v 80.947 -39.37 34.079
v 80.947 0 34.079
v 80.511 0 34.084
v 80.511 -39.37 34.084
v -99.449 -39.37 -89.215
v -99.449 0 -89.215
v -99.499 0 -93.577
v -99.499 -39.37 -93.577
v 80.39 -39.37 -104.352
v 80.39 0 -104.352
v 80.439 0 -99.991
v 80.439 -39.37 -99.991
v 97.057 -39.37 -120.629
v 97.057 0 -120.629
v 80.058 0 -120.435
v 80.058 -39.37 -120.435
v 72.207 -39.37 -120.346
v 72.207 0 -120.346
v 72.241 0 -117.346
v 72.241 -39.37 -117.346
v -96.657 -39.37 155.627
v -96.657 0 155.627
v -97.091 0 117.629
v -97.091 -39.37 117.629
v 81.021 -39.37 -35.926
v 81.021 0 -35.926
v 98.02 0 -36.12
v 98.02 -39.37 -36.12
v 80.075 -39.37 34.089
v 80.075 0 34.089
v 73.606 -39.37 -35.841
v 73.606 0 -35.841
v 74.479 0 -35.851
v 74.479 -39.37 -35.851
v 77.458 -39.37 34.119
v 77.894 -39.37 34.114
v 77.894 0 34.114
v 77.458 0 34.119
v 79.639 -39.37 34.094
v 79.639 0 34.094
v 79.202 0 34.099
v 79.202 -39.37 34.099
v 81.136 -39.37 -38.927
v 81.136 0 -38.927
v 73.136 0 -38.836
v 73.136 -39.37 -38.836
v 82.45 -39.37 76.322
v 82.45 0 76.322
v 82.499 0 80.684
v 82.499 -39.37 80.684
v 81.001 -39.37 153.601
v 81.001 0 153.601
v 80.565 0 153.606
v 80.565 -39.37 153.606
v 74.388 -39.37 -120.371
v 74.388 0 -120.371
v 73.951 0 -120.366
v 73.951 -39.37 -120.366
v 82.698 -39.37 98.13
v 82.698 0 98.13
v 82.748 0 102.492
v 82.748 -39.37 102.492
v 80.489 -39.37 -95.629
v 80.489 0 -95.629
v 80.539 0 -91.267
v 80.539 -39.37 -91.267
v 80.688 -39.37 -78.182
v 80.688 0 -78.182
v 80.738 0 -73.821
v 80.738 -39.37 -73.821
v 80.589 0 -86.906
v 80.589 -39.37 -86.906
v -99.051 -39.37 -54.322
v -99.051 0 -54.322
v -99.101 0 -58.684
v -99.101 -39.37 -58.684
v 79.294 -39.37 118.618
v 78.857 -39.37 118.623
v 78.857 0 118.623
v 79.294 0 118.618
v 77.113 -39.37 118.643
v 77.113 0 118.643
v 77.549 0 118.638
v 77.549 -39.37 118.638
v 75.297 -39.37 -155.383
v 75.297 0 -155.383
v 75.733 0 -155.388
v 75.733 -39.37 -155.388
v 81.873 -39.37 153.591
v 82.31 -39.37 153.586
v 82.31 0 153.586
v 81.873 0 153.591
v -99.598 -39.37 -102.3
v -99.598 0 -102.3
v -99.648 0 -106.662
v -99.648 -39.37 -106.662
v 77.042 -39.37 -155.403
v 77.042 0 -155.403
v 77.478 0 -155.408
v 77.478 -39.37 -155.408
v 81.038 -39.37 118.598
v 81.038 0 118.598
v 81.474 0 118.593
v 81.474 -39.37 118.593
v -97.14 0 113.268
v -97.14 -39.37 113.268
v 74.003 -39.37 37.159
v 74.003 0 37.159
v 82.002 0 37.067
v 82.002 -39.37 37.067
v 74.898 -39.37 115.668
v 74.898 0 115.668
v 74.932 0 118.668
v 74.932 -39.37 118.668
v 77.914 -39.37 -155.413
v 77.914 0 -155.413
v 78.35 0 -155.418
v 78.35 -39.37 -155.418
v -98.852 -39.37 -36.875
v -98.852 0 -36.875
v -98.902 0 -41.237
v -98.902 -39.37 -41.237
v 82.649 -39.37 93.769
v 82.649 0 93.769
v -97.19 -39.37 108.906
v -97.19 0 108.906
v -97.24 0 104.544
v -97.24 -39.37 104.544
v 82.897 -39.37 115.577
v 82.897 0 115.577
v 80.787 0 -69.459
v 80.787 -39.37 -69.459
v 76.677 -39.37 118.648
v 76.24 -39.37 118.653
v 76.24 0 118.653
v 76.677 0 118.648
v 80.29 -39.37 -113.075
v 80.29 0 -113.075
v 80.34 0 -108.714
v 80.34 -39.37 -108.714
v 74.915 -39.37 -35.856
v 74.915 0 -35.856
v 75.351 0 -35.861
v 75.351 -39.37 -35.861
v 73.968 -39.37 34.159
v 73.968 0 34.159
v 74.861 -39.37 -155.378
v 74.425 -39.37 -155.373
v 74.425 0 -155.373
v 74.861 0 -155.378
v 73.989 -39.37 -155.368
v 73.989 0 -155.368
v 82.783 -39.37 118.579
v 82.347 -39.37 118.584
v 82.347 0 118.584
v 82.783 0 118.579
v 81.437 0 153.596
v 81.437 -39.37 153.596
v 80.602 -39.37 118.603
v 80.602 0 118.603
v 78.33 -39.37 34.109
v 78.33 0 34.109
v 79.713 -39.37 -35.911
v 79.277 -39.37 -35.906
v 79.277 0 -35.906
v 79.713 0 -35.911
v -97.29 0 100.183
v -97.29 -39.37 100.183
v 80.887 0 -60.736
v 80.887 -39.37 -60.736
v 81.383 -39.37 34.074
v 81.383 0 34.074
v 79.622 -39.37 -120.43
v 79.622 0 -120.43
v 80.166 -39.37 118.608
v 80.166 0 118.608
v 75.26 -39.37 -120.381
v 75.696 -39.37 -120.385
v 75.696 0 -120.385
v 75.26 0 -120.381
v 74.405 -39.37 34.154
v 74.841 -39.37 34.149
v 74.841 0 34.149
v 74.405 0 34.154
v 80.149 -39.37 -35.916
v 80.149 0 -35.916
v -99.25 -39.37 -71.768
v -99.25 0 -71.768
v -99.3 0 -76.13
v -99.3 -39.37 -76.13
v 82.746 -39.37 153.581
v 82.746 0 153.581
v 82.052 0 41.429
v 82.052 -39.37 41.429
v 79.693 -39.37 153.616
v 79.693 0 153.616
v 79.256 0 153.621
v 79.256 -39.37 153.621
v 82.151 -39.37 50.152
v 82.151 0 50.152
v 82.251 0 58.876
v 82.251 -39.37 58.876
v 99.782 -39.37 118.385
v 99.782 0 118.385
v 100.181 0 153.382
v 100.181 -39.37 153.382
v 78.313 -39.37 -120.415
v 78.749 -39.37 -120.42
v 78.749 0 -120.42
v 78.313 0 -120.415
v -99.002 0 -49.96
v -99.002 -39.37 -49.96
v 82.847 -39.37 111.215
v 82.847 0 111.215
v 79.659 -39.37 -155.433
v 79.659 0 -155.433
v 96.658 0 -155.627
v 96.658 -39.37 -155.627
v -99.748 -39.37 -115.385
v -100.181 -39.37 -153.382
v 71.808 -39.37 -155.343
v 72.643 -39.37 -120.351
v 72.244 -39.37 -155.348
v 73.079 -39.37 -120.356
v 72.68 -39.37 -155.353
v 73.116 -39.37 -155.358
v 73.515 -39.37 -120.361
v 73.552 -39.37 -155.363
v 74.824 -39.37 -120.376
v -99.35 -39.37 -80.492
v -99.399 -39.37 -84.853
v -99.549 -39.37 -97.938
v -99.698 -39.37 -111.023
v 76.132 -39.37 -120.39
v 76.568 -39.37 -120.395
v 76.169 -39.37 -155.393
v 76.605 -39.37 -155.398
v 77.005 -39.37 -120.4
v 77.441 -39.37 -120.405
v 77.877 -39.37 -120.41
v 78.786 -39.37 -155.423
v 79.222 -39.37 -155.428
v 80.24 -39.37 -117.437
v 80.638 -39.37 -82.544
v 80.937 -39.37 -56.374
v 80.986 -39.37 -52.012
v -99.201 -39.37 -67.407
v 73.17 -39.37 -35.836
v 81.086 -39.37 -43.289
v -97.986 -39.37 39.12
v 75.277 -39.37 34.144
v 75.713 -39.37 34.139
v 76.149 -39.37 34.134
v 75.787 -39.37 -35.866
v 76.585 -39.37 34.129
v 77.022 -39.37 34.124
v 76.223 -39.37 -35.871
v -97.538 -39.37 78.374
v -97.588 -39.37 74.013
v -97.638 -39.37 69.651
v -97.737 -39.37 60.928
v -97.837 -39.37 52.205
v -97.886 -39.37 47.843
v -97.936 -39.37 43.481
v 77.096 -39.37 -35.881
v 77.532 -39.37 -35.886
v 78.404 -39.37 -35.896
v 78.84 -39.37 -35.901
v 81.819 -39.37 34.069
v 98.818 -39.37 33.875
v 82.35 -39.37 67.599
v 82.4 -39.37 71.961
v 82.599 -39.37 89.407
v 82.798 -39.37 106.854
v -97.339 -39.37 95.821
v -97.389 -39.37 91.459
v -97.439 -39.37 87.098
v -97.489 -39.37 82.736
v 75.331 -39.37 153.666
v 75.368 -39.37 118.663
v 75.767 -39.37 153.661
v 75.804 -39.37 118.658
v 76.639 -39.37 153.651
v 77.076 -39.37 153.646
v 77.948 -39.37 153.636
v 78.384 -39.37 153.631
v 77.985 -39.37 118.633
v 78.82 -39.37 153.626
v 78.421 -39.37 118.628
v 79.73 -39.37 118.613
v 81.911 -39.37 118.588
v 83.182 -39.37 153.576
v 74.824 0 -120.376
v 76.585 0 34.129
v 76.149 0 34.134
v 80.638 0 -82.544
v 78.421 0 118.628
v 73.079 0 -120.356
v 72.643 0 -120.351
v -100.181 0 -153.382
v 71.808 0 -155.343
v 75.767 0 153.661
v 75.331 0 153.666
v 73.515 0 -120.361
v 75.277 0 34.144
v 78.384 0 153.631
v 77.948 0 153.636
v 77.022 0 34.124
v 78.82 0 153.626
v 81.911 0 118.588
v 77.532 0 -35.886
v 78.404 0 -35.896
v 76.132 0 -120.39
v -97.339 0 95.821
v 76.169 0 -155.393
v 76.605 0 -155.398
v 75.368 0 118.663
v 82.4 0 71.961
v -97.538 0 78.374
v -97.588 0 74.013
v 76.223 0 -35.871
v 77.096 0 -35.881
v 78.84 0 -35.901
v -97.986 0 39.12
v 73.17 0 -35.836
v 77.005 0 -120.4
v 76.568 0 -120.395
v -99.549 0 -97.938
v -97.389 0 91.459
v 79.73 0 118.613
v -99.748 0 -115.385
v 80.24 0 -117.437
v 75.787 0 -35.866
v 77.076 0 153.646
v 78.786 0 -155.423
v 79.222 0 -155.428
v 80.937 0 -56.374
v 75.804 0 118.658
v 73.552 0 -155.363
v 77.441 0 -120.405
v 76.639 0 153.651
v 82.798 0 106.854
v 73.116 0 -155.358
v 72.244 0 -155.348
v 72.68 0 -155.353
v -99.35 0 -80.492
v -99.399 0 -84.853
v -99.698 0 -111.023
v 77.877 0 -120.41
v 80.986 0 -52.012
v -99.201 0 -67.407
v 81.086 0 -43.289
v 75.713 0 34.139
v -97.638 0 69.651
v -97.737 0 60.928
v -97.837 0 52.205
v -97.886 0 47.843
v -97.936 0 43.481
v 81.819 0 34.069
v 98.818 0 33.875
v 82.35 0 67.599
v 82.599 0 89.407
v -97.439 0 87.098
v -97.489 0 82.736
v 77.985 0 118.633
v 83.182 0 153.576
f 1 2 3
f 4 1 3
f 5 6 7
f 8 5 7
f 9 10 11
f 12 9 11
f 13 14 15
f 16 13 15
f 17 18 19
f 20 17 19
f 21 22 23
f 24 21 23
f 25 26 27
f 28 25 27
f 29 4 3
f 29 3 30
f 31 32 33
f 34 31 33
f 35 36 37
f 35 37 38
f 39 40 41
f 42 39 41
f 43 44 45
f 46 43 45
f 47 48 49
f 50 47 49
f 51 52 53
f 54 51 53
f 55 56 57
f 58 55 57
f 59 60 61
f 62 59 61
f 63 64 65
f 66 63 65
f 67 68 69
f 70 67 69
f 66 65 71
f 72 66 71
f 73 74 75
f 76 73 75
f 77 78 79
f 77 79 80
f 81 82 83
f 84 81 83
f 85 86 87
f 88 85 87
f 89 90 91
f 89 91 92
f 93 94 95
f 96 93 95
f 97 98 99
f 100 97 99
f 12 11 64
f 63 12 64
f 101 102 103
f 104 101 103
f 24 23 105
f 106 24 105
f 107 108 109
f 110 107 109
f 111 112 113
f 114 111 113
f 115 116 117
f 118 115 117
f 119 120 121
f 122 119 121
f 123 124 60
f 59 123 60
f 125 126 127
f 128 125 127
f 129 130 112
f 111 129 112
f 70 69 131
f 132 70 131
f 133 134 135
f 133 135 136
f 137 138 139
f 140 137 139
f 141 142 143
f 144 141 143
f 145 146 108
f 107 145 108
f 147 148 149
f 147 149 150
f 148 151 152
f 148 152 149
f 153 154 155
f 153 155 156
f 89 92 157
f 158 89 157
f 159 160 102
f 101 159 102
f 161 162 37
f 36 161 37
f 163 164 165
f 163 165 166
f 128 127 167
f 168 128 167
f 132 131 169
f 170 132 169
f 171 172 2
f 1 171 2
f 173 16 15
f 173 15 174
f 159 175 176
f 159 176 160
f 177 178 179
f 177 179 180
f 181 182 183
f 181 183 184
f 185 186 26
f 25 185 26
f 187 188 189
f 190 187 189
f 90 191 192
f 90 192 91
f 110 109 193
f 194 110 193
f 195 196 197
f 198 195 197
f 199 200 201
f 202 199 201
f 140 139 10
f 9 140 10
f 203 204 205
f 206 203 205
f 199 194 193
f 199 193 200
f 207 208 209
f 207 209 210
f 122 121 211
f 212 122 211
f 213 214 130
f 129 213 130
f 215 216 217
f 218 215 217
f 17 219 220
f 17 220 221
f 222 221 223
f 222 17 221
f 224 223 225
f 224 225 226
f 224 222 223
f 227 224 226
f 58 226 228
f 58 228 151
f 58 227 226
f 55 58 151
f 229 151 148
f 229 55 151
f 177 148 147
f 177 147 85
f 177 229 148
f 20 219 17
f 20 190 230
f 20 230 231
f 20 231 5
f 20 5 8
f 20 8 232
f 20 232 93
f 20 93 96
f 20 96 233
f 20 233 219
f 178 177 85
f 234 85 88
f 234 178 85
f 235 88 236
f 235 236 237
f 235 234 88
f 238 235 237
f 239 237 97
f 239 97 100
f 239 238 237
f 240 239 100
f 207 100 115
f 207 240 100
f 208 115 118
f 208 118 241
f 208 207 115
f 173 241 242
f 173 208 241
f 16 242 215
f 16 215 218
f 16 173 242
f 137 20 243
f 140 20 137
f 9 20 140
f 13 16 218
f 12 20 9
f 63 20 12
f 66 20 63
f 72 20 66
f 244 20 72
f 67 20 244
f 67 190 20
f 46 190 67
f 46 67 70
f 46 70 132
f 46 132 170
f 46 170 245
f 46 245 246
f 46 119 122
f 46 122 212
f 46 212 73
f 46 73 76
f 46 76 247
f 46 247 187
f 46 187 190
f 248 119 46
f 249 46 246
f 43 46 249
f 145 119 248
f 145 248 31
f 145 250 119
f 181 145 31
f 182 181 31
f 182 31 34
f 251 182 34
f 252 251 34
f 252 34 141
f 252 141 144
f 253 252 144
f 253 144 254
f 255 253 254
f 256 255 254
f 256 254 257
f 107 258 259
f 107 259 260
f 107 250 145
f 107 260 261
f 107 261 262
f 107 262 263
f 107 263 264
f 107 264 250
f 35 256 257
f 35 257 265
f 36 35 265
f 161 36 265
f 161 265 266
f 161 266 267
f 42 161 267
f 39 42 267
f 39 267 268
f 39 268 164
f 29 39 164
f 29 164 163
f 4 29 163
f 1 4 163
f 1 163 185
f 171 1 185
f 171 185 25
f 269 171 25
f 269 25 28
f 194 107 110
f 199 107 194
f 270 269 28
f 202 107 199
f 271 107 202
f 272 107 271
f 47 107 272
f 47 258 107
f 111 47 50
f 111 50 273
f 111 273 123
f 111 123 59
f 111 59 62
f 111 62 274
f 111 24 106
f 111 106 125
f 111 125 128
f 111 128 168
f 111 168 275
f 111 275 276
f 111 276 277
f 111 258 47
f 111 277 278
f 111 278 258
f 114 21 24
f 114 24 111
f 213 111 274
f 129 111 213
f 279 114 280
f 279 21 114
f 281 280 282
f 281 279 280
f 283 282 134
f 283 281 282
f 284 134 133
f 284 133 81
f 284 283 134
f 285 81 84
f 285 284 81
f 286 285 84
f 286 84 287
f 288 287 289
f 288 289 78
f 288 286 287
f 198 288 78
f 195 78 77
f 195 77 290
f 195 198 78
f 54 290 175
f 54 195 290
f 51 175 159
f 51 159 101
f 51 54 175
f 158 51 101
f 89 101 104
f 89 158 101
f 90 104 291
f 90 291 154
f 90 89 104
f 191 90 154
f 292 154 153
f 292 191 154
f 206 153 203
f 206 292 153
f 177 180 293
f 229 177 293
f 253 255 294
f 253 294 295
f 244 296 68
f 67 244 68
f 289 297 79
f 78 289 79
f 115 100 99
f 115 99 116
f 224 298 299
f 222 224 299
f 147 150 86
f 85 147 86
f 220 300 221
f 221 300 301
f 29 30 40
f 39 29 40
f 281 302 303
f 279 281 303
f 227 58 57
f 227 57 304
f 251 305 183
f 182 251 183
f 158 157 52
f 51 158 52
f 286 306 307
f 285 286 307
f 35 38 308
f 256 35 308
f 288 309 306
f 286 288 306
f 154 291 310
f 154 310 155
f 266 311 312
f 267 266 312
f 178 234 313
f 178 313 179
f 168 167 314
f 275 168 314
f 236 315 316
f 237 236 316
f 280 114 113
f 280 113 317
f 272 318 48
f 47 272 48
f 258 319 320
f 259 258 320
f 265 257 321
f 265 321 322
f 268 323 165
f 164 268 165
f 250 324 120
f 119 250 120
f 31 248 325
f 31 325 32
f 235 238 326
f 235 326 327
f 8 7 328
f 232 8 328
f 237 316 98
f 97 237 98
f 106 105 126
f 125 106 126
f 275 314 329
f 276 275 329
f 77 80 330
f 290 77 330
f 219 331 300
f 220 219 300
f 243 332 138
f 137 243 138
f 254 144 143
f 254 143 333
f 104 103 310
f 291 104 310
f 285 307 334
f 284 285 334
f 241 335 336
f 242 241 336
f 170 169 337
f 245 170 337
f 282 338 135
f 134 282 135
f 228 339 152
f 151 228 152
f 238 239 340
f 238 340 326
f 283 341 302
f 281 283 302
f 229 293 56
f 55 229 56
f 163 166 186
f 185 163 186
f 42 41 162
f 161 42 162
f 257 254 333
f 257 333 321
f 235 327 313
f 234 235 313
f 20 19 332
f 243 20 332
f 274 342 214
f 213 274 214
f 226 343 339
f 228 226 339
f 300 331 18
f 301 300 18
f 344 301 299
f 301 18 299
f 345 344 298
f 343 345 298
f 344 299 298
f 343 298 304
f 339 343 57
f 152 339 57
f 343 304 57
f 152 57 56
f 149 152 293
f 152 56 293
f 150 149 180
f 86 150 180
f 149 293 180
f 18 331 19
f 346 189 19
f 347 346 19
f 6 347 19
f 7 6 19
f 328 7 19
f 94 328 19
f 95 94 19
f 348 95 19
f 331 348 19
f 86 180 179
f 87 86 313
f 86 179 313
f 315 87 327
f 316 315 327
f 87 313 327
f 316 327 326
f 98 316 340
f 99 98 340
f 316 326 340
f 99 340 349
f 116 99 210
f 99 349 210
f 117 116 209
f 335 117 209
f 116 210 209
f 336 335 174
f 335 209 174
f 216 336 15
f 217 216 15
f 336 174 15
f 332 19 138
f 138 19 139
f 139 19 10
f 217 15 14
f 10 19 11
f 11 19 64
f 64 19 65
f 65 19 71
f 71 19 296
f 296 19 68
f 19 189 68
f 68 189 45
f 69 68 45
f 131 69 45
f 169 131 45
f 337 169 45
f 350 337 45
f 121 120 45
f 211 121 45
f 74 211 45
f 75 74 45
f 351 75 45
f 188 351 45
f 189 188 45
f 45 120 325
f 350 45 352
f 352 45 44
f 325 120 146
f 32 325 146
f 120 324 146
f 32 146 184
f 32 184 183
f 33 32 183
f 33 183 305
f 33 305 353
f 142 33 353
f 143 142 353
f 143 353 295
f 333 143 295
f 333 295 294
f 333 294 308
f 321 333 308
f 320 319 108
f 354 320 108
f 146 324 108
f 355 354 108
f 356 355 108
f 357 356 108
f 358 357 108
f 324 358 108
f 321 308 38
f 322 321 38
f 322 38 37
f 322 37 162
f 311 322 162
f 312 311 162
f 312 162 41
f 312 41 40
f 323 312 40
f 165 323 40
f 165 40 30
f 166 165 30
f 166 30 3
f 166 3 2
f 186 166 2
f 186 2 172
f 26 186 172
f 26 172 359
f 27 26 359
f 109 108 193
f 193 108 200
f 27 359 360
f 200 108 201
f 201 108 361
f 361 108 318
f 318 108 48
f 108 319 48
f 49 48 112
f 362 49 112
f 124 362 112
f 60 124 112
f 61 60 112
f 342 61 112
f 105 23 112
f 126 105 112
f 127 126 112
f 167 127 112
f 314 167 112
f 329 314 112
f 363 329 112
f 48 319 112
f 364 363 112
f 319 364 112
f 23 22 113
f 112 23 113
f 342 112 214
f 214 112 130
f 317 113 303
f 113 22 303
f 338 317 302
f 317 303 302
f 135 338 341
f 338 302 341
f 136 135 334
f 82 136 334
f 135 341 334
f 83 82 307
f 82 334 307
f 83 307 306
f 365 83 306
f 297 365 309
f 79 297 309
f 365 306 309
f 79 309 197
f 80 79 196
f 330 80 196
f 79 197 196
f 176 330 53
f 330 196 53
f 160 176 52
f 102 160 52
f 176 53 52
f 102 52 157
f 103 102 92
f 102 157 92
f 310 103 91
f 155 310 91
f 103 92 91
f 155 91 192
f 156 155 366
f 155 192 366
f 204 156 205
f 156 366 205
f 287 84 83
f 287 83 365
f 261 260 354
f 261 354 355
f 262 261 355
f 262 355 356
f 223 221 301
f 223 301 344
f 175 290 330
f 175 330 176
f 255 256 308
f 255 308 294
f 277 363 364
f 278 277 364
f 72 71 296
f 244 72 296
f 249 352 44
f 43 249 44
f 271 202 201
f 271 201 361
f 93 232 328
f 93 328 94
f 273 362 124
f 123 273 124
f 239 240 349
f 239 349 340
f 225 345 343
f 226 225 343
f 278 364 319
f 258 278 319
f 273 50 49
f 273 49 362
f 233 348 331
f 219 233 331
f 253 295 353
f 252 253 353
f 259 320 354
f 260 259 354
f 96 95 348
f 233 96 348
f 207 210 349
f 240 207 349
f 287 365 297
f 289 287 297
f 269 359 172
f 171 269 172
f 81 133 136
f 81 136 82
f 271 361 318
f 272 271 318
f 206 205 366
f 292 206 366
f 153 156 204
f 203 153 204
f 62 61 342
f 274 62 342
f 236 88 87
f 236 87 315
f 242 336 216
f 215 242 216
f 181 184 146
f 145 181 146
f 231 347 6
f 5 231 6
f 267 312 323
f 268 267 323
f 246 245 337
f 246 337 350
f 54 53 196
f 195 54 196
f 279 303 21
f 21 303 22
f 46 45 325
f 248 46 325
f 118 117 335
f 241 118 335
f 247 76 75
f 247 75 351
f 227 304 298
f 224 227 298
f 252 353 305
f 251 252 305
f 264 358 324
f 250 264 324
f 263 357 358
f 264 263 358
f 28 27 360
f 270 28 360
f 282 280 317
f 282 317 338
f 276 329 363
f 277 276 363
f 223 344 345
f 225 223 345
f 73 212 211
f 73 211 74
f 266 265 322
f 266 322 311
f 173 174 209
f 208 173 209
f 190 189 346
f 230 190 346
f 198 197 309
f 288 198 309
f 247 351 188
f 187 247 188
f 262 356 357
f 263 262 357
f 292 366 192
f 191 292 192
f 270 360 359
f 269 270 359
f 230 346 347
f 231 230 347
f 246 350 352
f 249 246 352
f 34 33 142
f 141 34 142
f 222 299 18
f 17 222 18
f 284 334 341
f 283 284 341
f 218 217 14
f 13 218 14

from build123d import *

# Parameters (mm, degrees)
F1_DEPTH = 100
F2_SCALE = 0.3937


with BuildPart() as f1:
    # F0 (on Front) → F1 (new body)
    with BuildSketch(Plane.XZ):
        Polygon((-253.359285, -293.078281), (-254.4597146, -389.5920072), (182.3918882, -394.5729472), (183.49976, -394.5855964), (184.6076064, -394.5982202), (185.7154782, -394.610844), (186.8233246, -394.6234932), (187.9311964, -394.636117), (189.0390428, -394.6487408), (190.1469146, -394.66139), (191.254761, -394.6740138), (192.3626328, -394.6866376), (193.4705046, -394.6992868), (194.578351, -394.7119106), (195.6862228, -394.7245344), (196.7940692, -394.7371582), (197.901941, -394.7498074), (199.0098128, -394.7624312), (200.1176592, -394.775055), (201.2255056, -394.7877042), (202.3333774, -394.800328), (245.5105834, -395.2926308), (246.524145, -306.3983966), (203.346939, -305.9061192), (202.2390672, -305.89347), (201.1312208, -305.8808462), (200.0233744, -305.8682224), (198.9155026, -305.8555732), (197.8076308, -305.8429494), (196.6997844, -305.8303256), (195.5919126, -305.8176764), (194.4840662, -305.8050526), (193.3761944, -305.7924288), (192.2683226, -305.7797796), (191.1604762, -305.7671558), (190.0526044, -305.754532), (188.944758, -305.7418828), (187.8368862, -305.729259), (186.7290398, -305.7166352), (185.621168, -305.7040114), (184.5133216, -305.6913622), (183.4054498, -305.6787384), (183.4923178, -298.059221), (203.810997, -298.2908944), (203.9373366, -287.2123034), (204.0636508, -276.133687), (204.189965, -265.055096), (204.3162792, -253.9764796), (204.4425934, -242.8978886), (204.5689076, -231.8192722), (204.6952218, -220.7406812), (204.821536, -209.6620648), (204.9478756, -198.5834738), (205.0741898, -187.5048574), (205.200504, -176.4262664), (205.3268182, -165.34765), (205.4531324, -154.2690336), (205.5794466, -143.1904426), (205.7057608, -132.1118262), (205.832075, -121.0332352), (205.9583892, -109.9546442), (206.0847288, -98.8760278), (185.7660496, -98.6443544), (185.8529176, -91.0248624), (186.960764, -91.0374862), (188.0686358, -91.05011), (189.1765076, -91.0627338), (190.284354, -91.075383), (191.3922258, -91.0880068), (192.5000722, -91.1006306), (193.607944, -91.1132798), (194.7157904, -91.1259036), (195.8236368, -91.1385274), (196.9315086, -91.1511766), (198.0393804, -91.1638004), (199.1472522, -91.1764242), (200.2550986, -91.1890734), (201.3629704, -91.2016972), (202.4708168, -91.214321), (203.5786632, -91.2269702), (204.686535, -91.239594), (205.7944068, -91.2522178), (248.9715874, -91.7445206), (250.998736, 86.0439224), (207.82153, 86.5362252), (206.7136582, 86.548849), (205.6058118, 86.5614982), (204.49794, 86.574122), (203.3900936, 86.5867458), (202.2822218, 86.5993696), (201.1743754, 86.6120188), (200.0665036, 86.6246426), (198.9586318, 86.6372664), (197.8507854, 86.6499156), (196.742939, 86.6625394), (195.6350672, 86.6751632), (194.5271954, 86.6878124), (193.419349, 86.7004362), (192.3114772, 86.71306), (191.2036308, 86.7257092), (190.095759, 86.738333), (188.9879126, 86.7509568), (187.8800408, 86.7635806), (187.9669088, 94.383098), (208.285588, 94.1514246), (208.4119276, 105.2300156), (208.5382418, 116.308632), (208.664556, 127.3872484), (208.7908702, 138.4658394), (208.9171844, 149.5444304), (209.0434986, 160.6230468), (209.1698128, 171.7016632), (209.296127, 182.7802542), (209.4224412, 193.8588706), (209.5487808, 204.937487), (209.675095, 216.016078), (209.8014092, 227.094669), (209.9277234, 238.1732854), (210.0540376, 249.2518764), (210.1803518, 260.3304928), (210.306666, 271.4090838), (210.4329802, 282.4877002), (210.5593198, 293.5663166), (190.2406406, 293.7979646), (190.3275086, 301.417482), (191.435355, 301.4048582), (192.5432268, 301.392209), (193.6510986, 301.3795852), (194.758945, 301.3669614), (195.8668168, 301.3543122), (196.9746886, 301.3416884), (198.082535, 301.3290646), (199.1903814, 301.3164154), (200.2982532, 301.3037916), (201.4060996, 301.2911678), (202.5139714, 301.278544), (203.6218432, 301.2658948), (204.7296896, 301.253271), (205.8375614, 301.2406472), (206.9454078, 301.227998), (208.0532796, 301.2153742), (209.161126, 301.2027504), (210.2689978, 301.1901012), (253.4461784, 300.6977984), (254.45974, 389.5920326), (211.2825594, 390.0843354), (210.1746876, 390.0969592), (209.0668412, 390.109583), (207.9589694, 390.1222322), (206.851123, 390.134856), (205.7432512, 390.1474798), (204.6354048, 390.160129), (203.527533, 390.1727528), (202.4196612, 390.1853766), (201.3118148, 390.1980258), (200.2039684, 390.2106496), (199.0960966, 390.2232734), (197.9882502, 390.2359226), (196.8803784, 390.2485464), (195.7725066, 390.2611702), (194.6646602, 390.2738194), (193.5567884, 390.2864432), (192.4489166, 390.299067), (191.3410702, 390.3116908), (-245.5105326, 395.2926308), (-246.6109876, 298.7789046), (-246.7373018, 287.7003136), (-246.863616, 276.6216972), (-246.9899302, 265.5431062), (-247.1162444, 254.4644898), (-247.2425586, 243.3858988), (-247.3688728, 232.3072824), (-247.495187, 221.2286914), (-247.6215266, 210.150075), (-247.7478408, 199.071484), (-247.874155, 187.9928676), (-248.0004692, 176.9142766), (-248.1267834, 165.8356602), (-248.2530976, 154.7570438), (-248.3794118, 143.6784528), (-248.505726, 132.5998618), (-248.6320402, 121.5212454), (-248.7583798, 110.442629), (-248.884694, 99.364038), (-251.0855532, -93.6634144), (-251.2118928, -104.7420308), (-251.338207, -115.8206218), (-251.4645212, -126.8992128), (-251.5908354, -137.9778292), (-251.7171496, -149.0564202), (-251.8434638, -160.1350366), (-251.969778, -171.213653), (-252.0960922, -182.292244), (-252.2224318, -193.3708604), (-252.348746, -204.4494514), (-252.4750602, -215.5280678), (-252.6013744, -226.6066588), (-252.7276886, -237.6852752), (-252.8540028, -248.7638662), (-252.980317, -259.8424826), (-253.1066312, -270.9210736), (-253.2329454, -281.99969), align=None)
    extrude(amount=F1_DEPTH)


with BuildPart() as f1_1:
    # F2: moved
    add(f1.part.scale(F2_SCALE))


solid = f1_1.part
